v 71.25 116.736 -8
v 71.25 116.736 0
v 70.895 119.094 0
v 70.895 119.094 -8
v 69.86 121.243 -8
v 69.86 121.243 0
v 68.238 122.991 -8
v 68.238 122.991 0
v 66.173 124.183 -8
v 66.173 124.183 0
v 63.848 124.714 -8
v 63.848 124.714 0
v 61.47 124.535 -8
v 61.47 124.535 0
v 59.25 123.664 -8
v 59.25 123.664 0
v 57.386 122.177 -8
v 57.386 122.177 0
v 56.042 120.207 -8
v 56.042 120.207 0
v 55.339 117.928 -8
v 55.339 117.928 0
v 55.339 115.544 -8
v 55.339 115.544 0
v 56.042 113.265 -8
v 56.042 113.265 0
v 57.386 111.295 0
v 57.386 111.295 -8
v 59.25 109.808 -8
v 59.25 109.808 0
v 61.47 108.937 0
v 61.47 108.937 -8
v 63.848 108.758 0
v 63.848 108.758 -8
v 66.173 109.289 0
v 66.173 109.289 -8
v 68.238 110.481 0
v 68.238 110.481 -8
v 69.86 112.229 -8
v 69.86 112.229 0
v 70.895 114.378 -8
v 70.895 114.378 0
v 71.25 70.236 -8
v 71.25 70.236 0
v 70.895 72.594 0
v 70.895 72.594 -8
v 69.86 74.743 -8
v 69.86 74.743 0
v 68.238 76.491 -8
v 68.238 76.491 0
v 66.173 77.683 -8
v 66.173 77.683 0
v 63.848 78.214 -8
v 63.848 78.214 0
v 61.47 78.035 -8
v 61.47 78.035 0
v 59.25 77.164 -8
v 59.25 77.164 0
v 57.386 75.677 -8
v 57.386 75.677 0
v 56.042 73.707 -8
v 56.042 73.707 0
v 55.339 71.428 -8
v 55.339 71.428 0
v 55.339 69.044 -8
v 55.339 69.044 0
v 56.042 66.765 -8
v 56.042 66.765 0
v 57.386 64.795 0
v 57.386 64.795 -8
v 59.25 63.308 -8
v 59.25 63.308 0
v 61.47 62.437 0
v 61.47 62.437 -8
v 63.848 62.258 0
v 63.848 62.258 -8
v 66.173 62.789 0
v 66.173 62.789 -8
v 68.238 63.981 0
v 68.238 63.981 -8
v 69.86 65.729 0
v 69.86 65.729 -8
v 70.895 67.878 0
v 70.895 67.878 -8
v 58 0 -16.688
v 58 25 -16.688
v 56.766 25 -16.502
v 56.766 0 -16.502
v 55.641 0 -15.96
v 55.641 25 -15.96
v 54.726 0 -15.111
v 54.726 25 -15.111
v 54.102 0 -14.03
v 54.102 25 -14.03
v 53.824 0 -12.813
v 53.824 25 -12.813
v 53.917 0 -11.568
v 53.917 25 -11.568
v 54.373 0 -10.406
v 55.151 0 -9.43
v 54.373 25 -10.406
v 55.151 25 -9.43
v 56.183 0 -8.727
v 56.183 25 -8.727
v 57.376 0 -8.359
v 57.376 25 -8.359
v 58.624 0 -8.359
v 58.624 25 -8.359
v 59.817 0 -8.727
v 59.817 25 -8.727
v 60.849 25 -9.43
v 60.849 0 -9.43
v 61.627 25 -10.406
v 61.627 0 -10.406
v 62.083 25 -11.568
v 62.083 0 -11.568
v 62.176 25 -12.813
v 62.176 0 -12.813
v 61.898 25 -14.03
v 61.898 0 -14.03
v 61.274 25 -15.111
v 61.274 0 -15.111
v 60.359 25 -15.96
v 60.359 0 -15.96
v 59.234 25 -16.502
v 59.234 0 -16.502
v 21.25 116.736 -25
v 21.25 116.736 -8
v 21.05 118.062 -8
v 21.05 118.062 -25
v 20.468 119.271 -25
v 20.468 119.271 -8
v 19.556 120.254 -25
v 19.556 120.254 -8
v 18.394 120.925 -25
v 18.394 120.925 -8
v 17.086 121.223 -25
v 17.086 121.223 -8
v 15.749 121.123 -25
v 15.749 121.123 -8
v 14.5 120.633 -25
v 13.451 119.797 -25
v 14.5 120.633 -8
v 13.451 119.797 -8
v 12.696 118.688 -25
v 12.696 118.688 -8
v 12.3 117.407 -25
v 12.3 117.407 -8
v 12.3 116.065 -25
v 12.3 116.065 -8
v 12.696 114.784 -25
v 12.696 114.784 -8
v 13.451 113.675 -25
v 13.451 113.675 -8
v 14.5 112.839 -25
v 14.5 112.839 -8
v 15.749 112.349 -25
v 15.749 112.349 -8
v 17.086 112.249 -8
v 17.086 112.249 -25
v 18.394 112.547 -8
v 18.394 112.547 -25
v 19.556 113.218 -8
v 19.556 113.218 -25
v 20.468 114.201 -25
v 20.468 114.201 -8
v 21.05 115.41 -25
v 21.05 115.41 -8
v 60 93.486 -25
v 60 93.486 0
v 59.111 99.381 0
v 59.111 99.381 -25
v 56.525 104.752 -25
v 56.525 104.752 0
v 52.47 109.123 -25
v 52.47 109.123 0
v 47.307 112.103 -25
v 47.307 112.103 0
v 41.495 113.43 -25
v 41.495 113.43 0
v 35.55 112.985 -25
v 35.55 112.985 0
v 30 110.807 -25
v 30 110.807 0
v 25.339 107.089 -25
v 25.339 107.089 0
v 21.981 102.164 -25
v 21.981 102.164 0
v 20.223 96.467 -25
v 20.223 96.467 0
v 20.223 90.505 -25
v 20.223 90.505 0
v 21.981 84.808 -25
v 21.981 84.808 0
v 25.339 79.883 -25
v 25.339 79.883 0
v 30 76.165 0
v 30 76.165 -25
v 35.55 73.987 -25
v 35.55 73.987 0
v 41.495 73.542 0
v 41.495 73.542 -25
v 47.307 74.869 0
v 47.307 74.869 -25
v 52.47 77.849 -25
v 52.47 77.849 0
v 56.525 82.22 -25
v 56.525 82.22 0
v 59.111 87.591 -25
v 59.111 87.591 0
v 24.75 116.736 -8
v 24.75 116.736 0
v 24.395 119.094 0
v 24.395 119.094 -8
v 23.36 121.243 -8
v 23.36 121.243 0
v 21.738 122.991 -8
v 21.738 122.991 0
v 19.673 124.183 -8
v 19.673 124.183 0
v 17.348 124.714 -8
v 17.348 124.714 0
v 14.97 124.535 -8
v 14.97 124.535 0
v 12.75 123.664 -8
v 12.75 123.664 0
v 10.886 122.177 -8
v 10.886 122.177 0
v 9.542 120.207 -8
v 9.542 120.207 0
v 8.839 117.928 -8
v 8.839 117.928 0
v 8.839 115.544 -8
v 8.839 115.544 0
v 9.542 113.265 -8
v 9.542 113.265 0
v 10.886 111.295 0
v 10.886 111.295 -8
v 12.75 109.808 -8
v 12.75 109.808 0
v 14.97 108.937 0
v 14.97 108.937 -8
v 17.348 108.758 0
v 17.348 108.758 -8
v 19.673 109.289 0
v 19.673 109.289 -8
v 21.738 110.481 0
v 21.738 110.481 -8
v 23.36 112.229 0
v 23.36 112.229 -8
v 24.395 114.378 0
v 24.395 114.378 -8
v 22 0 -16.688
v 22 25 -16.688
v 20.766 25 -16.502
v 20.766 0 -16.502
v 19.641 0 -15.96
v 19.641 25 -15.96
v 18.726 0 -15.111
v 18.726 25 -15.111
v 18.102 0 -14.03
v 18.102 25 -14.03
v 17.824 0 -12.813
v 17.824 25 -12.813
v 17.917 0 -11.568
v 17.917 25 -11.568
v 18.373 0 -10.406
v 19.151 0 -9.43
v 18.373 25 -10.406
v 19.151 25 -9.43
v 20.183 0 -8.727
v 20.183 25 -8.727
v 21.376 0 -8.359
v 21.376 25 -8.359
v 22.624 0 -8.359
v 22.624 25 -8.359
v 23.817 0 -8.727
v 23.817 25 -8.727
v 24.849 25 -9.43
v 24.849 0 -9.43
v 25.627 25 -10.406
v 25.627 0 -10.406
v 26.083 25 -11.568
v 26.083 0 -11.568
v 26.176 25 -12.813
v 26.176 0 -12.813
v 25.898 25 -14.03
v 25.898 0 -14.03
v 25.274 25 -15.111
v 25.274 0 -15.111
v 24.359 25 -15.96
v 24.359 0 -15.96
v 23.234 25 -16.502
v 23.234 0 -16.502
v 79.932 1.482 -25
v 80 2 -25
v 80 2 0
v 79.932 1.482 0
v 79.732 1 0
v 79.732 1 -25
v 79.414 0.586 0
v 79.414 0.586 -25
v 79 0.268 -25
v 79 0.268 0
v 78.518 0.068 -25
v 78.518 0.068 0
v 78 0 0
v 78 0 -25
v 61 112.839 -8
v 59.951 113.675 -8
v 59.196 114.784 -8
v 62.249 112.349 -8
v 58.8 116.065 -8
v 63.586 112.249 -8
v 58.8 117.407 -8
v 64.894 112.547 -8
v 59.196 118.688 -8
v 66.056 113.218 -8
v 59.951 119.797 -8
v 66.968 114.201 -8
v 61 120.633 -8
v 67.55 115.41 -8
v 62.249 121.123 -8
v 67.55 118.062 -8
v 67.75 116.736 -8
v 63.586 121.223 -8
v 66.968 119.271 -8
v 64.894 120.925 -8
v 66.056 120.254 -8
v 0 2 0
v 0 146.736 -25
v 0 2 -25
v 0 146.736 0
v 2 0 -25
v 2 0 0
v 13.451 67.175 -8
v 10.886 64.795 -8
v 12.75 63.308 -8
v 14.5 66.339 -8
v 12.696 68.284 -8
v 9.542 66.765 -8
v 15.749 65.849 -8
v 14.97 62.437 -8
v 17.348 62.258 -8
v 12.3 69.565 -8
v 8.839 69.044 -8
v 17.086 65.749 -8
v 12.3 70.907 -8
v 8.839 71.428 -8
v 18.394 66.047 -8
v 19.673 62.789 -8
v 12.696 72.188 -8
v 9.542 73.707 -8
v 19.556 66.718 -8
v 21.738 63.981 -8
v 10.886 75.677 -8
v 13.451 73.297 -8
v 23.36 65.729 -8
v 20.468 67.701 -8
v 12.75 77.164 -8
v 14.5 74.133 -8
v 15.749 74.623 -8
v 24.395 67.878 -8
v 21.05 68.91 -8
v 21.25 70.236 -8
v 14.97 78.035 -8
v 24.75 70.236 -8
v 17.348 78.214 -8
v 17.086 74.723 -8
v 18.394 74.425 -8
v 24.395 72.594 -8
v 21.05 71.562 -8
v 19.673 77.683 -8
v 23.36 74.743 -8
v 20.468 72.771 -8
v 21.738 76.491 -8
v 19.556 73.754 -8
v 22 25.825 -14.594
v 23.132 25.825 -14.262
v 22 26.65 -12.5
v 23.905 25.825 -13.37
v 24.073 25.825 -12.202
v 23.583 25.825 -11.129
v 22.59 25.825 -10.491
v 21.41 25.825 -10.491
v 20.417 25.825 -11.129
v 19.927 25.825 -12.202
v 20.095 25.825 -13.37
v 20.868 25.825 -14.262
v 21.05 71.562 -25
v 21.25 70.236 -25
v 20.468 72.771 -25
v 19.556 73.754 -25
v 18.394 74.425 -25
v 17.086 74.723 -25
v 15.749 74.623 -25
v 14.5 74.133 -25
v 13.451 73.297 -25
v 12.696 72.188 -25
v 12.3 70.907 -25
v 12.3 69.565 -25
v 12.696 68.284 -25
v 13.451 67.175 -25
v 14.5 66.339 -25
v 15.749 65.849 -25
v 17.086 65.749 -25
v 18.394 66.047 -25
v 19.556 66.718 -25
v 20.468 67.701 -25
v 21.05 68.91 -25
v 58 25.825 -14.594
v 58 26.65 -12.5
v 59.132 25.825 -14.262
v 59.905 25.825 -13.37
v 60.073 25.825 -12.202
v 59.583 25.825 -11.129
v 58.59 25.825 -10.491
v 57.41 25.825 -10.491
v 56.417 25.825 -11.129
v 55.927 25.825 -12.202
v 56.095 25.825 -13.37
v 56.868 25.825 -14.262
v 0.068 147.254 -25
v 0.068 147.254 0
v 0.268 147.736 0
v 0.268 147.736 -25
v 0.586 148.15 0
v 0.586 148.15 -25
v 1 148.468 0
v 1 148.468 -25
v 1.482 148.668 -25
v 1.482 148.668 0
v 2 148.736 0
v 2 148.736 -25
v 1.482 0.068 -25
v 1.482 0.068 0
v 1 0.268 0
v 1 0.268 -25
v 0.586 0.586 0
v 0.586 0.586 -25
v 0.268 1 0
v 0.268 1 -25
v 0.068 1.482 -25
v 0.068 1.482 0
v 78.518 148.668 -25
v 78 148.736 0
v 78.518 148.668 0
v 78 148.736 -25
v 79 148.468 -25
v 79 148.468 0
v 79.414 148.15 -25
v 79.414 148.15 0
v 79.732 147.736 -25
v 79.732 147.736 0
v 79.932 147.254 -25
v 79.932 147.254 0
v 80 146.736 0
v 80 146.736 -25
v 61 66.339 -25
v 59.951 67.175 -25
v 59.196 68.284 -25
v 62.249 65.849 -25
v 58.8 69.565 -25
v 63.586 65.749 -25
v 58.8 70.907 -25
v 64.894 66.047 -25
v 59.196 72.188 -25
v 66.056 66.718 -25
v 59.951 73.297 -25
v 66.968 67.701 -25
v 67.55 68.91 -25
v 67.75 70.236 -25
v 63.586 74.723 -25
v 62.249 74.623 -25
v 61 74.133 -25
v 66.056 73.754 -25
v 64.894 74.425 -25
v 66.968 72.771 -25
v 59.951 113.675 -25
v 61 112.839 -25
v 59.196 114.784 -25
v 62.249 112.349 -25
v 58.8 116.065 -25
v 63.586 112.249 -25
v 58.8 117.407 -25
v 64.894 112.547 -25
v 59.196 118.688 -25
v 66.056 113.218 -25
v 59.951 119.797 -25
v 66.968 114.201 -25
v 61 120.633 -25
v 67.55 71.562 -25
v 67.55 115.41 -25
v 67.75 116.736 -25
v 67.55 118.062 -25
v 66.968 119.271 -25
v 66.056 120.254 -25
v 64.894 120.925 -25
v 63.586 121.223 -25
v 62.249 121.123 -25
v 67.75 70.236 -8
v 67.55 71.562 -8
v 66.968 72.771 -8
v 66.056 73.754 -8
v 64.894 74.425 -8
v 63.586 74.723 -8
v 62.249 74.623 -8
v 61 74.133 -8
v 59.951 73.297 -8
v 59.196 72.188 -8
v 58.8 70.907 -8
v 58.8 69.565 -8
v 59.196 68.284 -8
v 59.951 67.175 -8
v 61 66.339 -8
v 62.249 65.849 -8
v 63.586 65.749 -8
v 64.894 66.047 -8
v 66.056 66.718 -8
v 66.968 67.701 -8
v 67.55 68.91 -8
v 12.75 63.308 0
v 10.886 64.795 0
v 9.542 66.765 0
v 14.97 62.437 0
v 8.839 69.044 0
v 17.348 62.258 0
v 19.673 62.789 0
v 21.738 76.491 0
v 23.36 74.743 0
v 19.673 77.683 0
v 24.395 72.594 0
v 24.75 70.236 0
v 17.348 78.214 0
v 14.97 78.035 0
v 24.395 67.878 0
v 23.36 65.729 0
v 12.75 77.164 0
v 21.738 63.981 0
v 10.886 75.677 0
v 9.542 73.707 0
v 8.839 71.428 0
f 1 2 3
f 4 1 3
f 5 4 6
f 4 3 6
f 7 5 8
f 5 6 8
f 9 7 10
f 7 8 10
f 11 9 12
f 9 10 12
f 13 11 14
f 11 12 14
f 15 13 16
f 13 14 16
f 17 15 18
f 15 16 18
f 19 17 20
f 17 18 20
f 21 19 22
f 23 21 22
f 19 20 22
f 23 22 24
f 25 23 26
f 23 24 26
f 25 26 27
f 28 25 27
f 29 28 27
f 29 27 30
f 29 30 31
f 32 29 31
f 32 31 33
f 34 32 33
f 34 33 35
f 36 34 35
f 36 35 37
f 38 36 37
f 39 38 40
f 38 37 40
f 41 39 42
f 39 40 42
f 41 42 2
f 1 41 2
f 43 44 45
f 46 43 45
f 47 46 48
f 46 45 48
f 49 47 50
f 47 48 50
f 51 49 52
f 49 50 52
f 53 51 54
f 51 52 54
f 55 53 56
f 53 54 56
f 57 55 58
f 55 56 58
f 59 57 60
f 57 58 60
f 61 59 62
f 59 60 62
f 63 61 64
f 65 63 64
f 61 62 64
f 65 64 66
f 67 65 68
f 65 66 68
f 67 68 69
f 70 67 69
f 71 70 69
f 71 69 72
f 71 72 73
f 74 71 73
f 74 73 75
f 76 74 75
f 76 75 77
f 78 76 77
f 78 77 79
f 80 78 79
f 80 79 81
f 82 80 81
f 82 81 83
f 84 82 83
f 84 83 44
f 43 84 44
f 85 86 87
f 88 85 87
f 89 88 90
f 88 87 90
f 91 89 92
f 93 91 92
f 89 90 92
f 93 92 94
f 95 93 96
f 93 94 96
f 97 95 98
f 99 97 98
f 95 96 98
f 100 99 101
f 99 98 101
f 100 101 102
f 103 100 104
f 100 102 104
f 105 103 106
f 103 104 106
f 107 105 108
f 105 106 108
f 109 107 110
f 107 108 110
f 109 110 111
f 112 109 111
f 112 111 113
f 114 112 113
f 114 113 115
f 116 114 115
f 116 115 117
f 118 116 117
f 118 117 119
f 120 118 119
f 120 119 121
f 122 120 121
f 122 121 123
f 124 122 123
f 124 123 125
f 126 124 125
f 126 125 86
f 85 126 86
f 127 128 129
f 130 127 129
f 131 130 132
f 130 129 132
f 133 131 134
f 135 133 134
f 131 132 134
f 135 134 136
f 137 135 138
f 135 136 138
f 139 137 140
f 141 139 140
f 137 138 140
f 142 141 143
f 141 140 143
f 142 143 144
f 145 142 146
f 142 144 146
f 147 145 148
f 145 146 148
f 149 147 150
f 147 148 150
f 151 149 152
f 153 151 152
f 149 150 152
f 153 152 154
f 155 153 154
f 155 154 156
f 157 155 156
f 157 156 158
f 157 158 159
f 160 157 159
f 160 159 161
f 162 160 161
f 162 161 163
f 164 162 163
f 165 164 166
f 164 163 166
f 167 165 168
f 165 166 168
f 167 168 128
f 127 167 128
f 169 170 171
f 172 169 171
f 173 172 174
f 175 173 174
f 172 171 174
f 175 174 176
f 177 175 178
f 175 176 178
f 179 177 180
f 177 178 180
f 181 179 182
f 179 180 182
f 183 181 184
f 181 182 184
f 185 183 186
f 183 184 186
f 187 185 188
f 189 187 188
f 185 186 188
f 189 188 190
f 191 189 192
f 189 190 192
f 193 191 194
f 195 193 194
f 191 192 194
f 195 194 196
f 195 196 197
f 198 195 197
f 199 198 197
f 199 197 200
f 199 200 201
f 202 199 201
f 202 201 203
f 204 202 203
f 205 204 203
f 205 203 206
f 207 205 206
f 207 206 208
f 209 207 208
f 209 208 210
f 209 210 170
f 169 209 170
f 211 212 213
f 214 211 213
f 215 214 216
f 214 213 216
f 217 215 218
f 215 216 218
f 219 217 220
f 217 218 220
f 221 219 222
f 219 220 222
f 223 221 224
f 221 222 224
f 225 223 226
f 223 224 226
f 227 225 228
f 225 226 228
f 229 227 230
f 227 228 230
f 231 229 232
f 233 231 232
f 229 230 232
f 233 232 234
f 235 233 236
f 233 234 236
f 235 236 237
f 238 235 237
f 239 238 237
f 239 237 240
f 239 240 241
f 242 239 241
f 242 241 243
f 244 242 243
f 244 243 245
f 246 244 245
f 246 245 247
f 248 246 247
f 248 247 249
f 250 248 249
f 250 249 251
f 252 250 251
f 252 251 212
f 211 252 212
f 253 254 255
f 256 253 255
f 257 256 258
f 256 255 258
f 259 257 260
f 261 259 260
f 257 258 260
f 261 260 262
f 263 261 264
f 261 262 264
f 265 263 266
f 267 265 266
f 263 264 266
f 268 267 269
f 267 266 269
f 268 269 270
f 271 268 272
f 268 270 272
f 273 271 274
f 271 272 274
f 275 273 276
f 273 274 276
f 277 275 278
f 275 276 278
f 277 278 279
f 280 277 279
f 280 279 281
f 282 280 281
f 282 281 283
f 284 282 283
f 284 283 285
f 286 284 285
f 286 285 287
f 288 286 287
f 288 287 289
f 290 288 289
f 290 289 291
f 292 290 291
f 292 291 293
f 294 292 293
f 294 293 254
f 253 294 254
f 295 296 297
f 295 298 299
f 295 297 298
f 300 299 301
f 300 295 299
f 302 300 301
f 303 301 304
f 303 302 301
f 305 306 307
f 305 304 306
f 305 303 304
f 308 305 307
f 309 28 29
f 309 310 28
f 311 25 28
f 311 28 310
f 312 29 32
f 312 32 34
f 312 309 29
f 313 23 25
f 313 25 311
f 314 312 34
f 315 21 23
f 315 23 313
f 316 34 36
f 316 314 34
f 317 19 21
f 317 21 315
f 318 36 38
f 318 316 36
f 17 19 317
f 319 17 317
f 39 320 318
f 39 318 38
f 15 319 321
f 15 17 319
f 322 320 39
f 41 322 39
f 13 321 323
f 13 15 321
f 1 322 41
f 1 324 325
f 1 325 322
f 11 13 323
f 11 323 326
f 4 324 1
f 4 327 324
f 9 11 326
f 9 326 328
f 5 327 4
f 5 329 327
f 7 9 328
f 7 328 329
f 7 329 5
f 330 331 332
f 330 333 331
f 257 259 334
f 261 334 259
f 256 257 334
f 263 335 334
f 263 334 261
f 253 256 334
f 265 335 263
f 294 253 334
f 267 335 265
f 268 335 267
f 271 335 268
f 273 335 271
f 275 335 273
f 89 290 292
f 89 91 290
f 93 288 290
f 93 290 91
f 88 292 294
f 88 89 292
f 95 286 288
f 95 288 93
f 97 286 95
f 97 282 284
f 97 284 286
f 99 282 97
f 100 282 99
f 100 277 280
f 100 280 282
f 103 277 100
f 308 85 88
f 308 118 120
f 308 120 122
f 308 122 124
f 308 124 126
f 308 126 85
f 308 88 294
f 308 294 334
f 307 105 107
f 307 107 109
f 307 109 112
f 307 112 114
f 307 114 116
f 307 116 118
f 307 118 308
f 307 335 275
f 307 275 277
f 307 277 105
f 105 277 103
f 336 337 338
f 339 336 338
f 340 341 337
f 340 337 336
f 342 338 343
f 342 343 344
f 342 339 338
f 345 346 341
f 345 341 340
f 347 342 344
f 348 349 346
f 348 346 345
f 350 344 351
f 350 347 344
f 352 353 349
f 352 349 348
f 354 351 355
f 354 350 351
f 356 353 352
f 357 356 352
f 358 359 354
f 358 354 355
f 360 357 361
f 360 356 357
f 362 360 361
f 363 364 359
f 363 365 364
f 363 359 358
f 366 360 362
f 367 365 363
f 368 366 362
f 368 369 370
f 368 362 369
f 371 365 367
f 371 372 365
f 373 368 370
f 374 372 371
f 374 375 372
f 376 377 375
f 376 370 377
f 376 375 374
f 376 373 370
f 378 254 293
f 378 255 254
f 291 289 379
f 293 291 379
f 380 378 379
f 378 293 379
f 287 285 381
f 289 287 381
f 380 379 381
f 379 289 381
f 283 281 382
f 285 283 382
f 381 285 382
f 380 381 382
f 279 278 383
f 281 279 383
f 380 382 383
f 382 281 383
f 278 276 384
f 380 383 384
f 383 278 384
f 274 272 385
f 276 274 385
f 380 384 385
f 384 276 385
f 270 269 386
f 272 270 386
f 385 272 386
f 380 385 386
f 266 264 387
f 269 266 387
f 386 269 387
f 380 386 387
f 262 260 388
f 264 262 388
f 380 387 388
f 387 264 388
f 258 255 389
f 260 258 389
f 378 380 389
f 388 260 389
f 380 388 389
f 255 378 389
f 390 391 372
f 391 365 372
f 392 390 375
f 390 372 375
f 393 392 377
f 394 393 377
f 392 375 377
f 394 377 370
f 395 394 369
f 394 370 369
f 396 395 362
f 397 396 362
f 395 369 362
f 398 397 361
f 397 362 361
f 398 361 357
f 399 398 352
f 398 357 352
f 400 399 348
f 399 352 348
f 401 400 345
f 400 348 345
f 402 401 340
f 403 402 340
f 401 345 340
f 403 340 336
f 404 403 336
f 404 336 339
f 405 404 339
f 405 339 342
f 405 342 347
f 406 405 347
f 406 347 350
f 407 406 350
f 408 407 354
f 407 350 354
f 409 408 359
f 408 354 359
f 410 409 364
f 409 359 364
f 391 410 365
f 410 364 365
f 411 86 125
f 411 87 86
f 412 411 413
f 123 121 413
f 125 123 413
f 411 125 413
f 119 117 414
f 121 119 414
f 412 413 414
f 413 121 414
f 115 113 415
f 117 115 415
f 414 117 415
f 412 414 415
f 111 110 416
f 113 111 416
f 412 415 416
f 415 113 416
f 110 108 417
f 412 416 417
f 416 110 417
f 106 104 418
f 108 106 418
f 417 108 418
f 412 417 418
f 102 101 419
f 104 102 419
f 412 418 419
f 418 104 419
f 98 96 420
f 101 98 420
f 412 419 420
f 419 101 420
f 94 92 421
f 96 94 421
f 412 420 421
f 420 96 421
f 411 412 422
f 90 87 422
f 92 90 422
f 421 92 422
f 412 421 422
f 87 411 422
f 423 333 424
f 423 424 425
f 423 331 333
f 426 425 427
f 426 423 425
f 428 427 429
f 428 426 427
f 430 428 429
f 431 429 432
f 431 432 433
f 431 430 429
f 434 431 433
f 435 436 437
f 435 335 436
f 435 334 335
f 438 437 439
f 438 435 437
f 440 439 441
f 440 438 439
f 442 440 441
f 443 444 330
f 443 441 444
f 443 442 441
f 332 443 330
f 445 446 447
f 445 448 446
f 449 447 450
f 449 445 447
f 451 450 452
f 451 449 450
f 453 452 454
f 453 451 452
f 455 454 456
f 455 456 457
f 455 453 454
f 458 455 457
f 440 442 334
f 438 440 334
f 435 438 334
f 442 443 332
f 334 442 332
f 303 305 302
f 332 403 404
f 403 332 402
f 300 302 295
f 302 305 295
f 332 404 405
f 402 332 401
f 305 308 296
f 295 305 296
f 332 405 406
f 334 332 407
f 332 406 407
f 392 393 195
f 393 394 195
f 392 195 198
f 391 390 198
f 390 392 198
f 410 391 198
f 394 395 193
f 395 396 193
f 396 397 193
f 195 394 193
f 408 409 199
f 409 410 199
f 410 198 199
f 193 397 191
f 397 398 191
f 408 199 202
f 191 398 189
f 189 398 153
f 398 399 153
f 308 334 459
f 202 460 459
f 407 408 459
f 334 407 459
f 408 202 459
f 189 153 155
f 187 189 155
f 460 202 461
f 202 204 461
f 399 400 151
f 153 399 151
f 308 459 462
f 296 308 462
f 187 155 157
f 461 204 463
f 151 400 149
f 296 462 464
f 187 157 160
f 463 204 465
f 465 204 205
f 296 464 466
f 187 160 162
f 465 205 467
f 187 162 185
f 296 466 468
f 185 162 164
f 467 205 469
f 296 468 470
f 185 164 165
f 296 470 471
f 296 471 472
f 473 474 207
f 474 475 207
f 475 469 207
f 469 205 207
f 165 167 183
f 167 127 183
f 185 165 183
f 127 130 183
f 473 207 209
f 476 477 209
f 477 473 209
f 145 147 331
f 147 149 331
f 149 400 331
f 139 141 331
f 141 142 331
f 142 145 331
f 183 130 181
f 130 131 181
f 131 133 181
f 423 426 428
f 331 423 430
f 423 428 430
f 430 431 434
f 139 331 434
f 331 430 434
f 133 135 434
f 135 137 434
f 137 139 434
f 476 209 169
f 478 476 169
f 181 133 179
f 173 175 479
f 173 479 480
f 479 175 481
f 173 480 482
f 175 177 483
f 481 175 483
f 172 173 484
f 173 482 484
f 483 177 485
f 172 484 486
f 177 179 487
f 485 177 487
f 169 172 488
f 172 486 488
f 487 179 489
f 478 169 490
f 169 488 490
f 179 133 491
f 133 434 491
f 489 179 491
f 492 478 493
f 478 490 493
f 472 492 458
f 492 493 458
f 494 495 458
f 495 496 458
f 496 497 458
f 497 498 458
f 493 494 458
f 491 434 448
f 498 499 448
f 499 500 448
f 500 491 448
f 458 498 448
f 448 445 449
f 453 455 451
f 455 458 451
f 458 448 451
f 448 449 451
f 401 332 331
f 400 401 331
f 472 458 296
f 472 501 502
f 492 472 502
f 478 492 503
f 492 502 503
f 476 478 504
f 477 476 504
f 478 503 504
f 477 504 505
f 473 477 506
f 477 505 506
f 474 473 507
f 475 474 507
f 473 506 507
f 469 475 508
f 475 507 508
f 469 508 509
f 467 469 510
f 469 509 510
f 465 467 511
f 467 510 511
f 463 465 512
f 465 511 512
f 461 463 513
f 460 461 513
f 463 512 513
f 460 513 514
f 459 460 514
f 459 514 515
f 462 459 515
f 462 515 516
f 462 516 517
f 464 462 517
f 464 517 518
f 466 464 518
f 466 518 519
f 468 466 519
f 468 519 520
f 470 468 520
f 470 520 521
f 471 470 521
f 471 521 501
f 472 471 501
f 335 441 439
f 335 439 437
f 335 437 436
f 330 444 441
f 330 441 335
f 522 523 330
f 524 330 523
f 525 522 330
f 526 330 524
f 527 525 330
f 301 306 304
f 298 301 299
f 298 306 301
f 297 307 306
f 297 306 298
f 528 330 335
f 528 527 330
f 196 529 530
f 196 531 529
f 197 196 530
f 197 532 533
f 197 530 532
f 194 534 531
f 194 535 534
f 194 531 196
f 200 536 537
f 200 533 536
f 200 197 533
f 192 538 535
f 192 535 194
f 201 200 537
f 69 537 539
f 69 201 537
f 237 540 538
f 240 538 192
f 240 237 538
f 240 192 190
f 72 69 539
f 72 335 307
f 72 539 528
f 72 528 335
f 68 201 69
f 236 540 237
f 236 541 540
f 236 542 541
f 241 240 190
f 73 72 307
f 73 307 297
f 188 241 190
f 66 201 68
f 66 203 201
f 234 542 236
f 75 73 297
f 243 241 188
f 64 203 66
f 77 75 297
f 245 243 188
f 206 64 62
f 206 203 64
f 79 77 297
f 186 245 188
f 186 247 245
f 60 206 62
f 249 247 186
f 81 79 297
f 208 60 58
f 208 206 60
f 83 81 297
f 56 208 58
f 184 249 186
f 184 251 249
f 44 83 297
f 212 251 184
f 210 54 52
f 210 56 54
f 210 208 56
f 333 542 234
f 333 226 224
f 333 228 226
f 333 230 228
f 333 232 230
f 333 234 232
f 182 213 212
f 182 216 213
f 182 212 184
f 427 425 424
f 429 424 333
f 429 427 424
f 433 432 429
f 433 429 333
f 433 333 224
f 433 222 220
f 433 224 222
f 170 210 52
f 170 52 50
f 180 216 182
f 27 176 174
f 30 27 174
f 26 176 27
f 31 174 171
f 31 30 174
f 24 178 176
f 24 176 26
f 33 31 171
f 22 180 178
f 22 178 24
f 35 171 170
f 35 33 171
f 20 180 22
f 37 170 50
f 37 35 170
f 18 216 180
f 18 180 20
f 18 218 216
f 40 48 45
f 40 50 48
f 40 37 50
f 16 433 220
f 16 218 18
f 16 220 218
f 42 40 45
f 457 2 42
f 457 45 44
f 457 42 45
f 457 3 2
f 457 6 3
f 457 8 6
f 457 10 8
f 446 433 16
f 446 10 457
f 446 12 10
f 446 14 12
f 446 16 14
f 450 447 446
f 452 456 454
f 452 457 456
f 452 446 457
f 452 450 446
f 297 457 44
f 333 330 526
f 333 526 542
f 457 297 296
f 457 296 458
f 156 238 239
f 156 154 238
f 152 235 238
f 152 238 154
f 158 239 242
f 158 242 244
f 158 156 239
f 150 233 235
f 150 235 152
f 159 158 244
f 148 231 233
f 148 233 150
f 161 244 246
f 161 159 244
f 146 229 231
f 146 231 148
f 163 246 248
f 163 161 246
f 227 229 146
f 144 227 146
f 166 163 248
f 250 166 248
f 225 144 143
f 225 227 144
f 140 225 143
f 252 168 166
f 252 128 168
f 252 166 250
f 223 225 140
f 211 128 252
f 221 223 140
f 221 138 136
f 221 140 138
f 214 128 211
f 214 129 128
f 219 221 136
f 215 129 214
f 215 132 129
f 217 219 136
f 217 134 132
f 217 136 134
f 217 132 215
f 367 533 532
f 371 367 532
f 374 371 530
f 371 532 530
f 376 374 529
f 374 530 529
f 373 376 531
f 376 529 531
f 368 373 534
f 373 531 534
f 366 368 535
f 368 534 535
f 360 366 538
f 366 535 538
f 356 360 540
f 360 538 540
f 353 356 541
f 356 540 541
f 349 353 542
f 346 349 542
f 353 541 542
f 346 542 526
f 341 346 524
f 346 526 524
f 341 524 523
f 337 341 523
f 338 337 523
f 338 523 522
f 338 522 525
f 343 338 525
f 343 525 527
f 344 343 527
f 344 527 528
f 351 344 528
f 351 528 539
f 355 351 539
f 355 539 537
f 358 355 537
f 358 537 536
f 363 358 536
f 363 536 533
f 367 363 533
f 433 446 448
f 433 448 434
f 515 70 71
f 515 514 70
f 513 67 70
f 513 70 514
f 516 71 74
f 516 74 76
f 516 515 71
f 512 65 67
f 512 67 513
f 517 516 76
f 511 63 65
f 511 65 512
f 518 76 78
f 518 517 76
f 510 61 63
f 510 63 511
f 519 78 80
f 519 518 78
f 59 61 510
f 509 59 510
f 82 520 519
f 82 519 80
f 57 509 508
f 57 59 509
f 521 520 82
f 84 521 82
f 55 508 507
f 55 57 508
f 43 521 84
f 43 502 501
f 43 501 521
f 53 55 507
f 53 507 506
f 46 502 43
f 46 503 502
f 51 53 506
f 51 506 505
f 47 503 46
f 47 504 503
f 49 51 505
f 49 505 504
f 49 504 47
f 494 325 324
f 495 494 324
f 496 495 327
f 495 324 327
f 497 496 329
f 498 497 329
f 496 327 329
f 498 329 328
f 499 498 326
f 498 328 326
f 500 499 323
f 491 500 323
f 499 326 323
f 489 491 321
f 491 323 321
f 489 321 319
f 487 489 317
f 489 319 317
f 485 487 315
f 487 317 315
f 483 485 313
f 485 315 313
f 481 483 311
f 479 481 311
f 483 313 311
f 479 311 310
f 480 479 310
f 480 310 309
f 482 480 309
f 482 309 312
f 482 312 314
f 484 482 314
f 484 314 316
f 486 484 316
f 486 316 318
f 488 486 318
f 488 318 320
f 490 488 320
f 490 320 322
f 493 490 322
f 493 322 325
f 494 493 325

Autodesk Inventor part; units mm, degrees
ref_plane "YZ Plane" through (0, 0, 0) normal (1, 0, 0) x (0, 1, 0)
ref_plane "XZ Plane" through (0, 0, 0) normal (0, 1, 0) x (-1, 0, 0)
ref_plane "XY Plane" through (0, 0, 0) normal (0, 0, 1) x (1, 0, 0)
sketch "Sketch1" plane through (0, 0, 0) normal (0, 0, 1) x (1, 0, 0)
  line L0 (0, 0) -> (80, 0)
  line L1 (80, 0) -> (80, 148.736)
  line L2 (80, 148.736) -> (0, 148.736)
  line L3 (0, 148.736) -> (0, 0)
  circle A0 centre (40, 93.486) radius 20
  circle A1 centre (16.75, 116.736) radius 4.5
  circle A2 centre (63.25, 116.736) radius 4.5
  circle A3 centre (16.75, 70.236) radius 4.5
  circle A4 centre (63.25, 70.236) radius 4.5
  dimension "d0" = 40
  dimension "d1" = 23.25
  dimension "d2" = 23.25
  dimension "d3" = 23.25
  dimension "d4" = 23.25
  dimension "d5" = 23.25
  dimension "d6" = 23.25
  dimension "d7" = 23.25
  dimension "d8" = 23.25
  dimension "d9" = 9
  dimension "d10" = 93.486
  dimension "d11" = 80
  dimension "d12" = 40
  dimension "d13" = 32
extrude "Extrusion1" add sketch "Sketch1" against normal blind 25
sketch "Sketch2" plane through (0, 0, 0) normal (0, 0, 1) x (1, 0, 0)
  circle A0 centre (16.75, 116.736) radius 4.5 projected
  circle A1 centre (63.25, 116.736) radius 4.5 projected
  circle A2 centre (16.75, 70.236) radius 4.5 projected
  circle A3 centre (63.25, 70.236) radius 4.5 projected
  circle A4 centre (16.75, 116.736) radius 8
  circle A5 centre (63.25, 116.736) radius 8
  circle A6 centre (16.75, 70.236) radius 8
  circle A7 centre (63.25, 70.236) radius 8
  point P0 (0, 0)
  dimension "d16" = 16
  dimension "d17" = 16
  dimension "d18" = 16
  dimension "d19" = 16
extrude "Extrusion2" cut sketch "Sketch2" against normal blind 8 contours A0 | A1 | A2 | A3 | A4 | A5 | A6 | A7
fillet "Fillet1" radius 2 4 edges at (80, 148.736, -12.5) (0, 148.736, -12.5) (80, 0, -12.5) (0, 0, -12.5)
sketch "Sketch3" plane through (2, 0, 0) normal (0, -1, 0) x (1, 0, 0)
  line L0 (-2, 0) -> (-2, -25) projected
  line L1 (78, -25) -> (78, 0) projected
  line L2 (0, 0) -> (76, 0) projected
  point P0 (20, -12.5)
  point P1 (56, -12.5)
  dimension "d28" = 22
  dimension "d29" = 12.5
  dimension "d30" = 22
  dimension "d31" = 12.5
hole "Hole1" at (58, 0, -12.5) at (22, 0, -12.5) direction (0, 1, 0) diameter 8.376 depth 25 tip angle 137 thread size "M10x1.5" class "6H" standard "ISO Metric profile"
equation "\"d2\" = d1"
equation "\"d3\" = d1"
equation "\"d4\" = d1"
equation "\"d5\" = d1"
equation "\"d6\" = d1"
equation "\"d7\" = d1"
equation "\"d8\" = d1"
equation "\"d12\" = 0.5 * d11"
equation "\"d30\" = d28"
equation "\"d31\" = d29"
properties part number "Soporte1_CilindroHorizontal"
